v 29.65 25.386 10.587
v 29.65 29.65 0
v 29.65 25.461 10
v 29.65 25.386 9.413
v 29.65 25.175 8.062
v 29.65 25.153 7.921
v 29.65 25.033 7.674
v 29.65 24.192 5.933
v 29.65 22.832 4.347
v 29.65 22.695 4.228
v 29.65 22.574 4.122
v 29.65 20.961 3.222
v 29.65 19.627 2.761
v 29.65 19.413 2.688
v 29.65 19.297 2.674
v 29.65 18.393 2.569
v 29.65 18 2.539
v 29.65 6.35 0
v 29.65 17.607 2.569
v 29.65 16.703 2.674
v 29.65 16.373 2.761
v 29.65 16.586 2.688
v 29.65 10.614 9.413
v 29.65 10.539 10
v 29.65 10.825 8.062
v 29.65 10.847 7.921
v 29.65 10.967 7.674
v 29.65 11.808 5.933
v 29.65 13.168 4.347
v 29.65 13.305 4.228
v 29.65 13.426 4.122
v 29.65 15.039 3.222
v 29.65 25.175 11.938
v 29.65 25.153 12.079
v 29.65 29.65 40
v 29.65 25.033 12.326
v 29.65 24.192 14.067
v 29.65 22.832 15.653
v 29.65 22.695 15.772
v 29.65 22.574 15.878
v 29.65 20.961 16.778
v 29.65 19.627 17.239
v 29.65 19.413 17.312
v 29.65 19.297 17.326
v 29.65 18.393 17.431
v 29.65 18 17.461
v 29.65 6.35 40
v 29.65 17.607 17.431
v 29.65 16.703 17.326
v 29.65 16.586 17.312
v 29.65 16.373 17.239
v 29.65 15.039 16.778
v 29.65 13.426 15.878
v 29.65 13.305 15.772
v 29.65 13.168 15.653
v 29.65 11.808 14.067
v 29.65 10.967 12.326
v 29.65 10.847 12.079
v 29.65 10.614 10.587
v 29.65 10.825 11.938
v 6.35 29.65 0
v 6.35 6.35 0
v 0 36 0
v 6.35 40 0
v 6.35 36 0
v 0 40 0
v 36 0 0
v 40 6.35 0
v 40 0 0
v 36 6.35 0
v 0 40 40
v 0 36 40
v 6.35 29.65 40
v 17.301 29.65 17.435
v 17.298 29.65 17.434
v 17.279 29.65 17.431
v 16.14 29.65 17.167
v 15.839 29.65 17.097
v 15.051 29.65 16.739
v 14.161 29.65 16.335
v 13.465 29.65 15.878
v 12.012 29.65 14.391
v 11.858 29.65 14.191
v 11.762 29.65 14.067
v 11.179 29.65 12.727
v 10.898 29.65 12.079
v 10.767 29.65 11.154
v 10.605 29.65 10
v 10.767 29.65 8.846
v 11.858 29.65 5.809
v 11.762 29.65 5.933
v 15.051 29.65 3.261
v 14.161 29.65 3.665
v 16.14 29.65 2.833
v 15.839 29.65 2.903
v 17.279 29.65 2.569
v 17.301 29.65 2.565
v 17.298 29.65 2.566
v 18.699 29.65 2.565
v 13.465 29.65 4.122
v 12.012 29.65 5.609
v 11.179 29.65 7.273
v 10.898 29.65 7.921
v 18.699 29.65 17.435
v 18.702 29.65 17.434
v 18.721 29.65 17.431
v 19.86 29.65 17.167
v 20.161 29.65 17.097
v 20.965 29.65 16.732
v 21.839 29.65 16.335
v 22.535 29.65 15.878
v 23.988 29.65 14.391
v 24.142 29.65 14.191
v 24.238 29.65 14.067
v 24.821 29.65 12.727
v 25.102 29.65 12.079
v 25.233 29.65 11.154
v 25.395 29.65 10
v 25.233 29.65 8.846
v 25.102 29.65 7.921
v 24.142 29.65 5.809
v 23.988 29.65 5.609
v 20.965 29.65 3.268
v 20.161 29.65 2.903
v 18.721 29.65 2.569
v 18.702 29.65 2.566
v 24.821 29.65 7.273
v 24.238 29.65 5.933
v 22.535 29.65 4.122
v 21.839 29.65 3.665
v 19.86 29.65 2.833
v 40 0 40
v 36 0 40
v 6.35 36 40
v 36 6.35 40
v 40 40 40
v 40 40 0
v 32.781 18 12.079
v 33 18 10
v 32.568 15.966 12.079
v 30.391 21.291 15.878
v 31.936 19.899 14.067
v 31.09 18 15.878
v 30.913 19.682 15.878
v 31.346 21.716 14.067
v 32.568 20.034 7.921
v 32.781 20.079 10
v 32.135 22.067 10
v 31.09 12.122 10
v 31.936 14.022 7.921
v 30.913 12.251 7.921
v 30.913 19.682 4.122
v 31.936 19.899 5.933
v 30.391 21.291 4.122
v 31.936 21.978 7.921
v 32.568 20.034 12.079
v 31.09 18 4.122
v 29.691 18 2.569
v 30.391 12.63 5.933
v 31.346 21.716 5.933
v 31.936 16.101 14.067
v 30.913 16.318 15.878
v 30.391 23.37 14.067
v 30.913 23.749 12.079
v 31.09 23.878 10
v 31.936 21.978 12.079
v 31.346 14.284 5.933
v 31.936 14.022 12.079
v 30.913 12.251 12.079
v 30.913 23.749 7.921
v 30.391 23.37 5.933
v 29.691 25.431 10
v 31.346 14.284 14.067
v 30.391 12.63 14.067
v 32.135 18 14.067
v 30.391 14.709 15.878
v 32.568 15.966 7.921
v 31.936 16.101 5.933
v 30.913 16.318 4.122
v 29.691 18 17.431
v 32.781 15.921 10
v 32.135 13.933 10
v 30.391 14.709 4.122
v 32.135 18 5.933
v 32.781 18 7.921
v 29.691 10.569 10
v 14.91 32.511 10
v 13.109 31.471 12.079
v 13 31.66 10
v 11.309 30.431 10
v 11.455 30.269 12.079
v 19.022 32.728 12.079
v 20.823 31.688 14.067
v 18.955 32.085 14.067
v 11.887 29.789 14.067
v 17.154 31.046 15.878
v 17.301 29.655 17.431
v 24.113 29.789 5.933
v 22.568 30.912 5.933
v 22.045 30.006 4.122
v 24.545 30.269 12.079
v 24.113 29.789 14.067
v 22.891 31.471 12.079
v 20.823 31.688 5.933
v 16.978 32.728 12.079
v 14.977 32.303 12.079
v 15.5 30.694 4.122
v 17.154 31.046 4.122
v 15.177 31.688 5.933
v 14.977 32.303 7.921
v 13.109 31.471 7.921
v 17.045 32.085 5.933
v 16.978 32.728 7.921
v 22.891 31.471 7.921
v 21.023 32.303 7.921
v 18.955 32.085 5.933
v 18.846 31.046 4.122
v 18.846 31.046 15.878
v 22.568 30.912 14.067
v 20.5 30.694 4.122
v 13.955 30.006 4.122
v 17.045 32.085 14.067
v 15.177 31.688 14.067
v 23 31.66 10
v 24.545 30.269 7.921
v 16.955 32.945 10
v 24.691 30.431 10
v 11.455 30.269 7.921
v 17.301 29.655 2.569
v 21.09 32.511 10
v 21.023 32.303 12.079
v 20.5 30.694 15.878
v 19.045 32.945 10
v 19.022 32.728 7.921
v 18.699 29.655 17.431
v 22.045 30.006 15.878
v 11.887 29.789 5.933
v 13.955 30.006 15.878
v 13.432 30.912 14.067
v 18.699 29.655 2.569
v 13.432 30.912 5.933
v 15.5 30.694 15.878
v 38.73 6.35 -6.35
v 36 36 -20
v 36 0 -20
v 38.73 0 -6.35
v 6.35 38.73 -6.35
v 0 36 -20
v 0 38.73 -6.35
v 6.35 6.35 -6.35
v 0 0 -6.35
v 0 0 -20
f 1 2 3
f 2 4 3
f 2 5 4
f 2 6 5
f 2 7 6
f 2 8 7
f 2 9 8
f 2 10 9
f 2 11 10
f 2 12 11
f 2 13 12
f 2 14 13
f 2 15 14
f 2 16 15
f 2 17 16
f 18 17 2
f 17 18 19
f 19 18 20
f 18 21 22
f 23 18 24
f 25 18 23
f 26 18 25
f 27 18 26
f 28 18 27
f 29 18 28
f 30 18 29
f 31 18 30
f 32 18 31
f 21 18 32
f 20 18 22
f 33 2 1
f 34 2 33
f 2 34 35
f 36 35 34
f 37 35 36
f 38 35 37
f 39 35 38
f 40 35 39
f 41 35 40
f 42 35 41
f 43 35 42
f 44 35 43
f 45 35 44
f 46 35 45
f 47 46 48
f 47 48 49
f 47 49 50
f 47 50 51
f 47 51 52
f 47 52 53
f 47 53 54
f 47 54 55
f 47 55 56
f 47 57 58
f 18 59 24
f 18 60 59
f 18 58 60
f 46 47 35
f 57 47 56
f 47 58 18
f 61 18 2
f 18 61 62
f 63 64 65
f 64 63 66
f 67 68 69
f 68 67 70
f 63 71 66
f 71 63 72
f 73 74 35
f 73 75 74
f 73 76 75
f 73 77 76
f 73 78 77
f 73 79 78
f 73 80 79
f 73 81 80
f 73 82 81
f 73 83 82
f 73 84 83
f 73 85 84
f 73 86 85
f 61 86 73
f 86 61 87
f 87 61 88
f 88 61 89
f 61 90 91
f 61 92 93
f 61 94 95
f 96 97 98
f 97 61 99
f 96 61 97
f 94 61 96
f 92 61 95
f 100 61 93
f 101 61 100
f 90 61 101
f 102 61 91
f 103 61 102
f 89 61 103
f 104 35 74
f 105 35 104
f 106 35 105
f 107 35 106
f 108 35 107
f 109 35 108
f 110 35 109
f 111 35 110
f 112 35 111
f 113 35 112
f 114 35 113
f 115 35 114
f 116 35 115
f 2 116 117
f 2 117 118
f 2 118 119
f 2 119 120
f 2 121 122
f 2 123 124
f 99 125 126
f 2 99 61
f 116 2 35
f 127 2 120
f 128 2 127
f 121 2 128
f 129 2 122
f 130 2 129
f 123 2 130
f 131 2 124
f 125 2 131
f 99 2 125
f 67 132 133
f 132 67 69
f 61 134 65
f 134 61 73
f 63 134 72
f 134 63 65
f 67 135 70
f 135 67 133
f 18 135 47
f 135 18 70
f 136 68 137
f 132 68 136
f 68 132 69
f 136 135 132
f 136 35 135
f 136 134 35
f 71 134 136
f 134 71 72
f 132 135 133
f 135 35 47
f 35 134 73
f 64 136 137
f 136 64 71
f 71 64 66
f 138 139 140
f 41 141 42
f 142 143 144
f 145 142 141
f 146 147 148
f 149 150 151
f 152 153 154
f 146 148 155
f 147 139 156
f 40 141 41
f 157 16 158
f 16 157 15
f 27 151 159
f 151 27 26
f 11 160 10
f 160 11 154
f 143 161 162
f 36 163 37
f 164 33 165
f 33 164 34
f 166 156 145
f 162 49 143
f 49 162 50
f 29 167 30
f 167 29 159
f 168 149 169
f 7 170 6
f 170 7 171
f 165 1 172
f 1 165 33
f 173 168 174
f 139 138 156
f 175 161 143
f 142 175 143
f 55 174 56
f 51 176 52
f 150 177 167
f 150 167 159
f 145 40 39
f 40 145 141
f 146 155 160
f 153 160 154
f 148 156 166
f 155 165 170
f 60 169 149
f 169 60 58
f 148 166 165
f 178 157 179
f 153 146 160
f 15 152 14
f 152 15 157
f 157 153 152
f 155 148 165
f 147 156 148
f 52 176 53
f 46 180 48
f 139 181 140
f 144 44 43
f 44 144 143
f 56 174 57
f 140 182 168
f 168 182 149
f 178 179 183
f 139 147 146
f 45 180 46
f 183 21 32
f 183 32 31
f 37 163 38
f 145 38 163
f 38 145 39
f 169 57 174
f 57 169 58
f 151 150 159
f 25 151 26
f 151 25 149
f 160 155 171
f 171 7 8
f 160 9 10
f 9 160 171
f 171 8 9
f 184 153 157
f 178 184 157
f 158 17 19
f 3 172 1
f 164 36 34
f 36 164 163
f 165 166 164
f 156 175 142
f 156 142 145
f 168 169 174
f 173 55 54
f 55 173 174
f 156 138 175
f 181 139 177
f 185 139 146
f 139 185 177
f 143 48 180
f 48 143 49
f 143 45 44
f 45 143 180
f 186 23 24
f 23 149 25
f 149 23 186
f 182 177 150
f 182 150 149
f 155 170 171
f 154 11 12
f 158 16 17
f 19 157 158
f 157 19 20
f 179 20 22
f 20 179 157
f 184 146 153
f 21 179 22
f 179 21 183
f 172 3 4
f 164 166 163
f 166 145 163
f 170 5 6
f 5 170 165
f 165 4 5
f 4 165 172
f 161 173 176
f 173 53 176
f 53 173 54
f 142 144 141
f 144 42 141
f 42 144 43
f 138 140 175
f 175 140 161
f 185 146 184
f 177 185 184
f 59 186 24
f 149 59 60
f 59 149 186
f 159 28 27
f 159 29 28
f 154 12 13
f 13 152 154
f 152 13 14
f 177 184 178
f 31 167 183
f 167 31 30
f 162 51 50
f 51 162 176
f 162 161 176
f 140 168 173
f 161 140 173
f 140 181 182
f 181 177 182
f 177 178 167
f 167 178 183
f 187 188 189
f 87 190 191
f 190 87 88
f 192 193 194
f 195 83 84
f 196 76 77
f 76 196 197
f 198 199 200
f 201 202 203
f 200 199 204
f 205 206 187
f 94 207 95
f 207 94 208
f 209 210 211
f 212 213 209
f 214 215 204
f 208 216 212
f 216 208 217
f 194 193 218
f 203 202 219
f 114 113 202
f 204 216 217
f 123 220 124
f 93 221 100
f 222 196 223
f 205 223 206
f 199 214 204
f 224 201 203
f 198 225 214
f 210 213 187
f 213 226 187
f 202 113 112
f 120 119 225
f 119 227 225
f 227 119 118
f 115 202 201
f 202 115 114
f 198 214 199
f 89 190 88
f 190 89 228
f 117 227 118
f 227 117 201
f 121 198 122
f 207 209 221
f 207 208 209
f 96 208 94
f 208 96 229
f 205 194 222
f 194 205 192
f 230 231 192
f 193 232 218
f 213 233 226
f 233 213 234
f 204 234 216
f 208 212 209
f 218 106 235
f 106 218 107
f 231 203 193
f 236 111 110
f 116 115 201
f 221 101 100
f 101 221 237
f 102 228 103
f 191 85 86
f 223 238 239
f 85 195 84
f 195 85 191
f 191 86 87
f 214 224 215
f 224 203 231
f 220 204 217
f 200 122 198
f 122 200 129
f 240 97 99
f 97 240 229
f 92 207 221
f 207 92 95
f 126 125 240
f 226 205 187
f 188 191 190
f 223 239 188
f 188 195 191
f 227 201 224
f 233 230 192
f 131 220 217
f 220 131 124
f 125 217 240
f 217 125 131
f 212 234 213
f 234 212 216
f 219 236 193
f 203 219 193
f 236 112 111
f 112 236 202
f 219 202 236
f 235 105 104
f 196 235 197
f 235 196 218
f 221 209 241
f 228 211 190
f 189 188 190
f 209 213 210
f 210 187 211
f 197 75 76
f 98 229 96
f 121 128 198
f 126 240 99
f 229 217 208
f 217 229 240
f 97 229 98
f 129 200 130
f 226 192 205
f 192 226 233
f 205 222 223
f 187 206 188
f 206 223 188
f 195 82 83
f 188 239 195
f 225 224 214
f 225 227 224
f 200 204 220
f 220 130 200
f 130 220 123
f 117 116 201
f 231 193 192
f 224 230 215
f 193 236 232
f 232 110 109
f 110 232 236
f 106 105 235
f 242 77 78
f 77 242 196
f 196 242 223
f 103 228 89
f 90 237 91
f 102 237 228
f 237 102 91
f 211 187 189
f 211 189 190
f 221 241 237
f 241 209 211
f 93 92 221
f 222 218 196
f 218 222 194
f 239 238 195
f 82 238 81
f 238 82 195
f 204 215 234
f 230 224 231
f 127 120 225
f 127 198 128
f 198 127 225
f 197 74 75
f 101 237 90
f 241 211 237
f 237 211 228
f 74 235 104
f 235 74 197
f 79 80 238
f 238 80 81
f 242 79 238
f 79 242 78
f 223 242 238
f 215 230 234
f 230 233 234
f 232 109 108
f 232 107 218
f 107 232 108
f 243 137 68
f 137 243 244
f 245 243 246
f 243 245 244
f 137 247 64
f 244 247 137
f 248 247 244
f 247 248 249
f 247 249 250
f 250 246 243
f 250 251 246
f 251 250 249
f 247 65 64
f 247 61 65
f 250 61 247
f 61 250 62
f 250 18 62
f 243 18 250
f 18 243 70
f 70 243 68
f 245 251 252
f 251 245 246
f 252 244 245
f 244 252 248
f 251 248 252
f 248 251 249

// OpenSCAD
$fn = 30;
shH = 40;
whallT = 4;
shN = shH-whallT;
legH = shH /2;
slot = 6.35;

module base() {
    difference(){
        cube(shH);
        union(){
            cube([shN - slot, shN - slot, shN+slot]);
            cube([slot, shN, shN+slot]);
            cube([shN, slot, shN+slot]);
        }
    }
}
module screwGap(){   
    translate([23,18, 10]){
        sphere(r = 10);
    }
    translate([18,23, 10]){
        sphere(r = 10);
    }
}

module leg(){
    legB = shH - whallT;
    legP = [
      [  0,  0,  0 ],  //0
      [ legB,  0,  0 ],  //1
      [ legB,  legB,  0 ],  //2
      [  0,  legB,  0 ],  //3
      [  0,  0,  legH  ],  //4
      [ shH,  0,  legH  ],  //5
      [ shH,  shH,  legH  ],  //6
      [  0,  shH,  legH  ]]; //7
    CubeFaces = [
      [0,1,2,3],  // bottom
      [4,5,1,0],  // front
      [7,6,5,4],  // top
      [5,6,2,1],  // right
      [6,7,3,2],  // back
      [7,4,0,3]];
    polyhedron(legP, CubeFaces);
}

module pedistal(){
    intersection(){
        leg();
        translate([slot,slot,legH - slot]){
            cube([shN, shN, slot]);
        }
    }
}

module foot(){
    difference(){
        leg();
        translate([0,0,legH - slot]){
            cube([shN+slot, shN+slot, slot]);
        }
    }
}



difference(){
    base();
    screwGap();
    
}
translate([0,0,-legH]){
    pedistal();
    foot();
}
